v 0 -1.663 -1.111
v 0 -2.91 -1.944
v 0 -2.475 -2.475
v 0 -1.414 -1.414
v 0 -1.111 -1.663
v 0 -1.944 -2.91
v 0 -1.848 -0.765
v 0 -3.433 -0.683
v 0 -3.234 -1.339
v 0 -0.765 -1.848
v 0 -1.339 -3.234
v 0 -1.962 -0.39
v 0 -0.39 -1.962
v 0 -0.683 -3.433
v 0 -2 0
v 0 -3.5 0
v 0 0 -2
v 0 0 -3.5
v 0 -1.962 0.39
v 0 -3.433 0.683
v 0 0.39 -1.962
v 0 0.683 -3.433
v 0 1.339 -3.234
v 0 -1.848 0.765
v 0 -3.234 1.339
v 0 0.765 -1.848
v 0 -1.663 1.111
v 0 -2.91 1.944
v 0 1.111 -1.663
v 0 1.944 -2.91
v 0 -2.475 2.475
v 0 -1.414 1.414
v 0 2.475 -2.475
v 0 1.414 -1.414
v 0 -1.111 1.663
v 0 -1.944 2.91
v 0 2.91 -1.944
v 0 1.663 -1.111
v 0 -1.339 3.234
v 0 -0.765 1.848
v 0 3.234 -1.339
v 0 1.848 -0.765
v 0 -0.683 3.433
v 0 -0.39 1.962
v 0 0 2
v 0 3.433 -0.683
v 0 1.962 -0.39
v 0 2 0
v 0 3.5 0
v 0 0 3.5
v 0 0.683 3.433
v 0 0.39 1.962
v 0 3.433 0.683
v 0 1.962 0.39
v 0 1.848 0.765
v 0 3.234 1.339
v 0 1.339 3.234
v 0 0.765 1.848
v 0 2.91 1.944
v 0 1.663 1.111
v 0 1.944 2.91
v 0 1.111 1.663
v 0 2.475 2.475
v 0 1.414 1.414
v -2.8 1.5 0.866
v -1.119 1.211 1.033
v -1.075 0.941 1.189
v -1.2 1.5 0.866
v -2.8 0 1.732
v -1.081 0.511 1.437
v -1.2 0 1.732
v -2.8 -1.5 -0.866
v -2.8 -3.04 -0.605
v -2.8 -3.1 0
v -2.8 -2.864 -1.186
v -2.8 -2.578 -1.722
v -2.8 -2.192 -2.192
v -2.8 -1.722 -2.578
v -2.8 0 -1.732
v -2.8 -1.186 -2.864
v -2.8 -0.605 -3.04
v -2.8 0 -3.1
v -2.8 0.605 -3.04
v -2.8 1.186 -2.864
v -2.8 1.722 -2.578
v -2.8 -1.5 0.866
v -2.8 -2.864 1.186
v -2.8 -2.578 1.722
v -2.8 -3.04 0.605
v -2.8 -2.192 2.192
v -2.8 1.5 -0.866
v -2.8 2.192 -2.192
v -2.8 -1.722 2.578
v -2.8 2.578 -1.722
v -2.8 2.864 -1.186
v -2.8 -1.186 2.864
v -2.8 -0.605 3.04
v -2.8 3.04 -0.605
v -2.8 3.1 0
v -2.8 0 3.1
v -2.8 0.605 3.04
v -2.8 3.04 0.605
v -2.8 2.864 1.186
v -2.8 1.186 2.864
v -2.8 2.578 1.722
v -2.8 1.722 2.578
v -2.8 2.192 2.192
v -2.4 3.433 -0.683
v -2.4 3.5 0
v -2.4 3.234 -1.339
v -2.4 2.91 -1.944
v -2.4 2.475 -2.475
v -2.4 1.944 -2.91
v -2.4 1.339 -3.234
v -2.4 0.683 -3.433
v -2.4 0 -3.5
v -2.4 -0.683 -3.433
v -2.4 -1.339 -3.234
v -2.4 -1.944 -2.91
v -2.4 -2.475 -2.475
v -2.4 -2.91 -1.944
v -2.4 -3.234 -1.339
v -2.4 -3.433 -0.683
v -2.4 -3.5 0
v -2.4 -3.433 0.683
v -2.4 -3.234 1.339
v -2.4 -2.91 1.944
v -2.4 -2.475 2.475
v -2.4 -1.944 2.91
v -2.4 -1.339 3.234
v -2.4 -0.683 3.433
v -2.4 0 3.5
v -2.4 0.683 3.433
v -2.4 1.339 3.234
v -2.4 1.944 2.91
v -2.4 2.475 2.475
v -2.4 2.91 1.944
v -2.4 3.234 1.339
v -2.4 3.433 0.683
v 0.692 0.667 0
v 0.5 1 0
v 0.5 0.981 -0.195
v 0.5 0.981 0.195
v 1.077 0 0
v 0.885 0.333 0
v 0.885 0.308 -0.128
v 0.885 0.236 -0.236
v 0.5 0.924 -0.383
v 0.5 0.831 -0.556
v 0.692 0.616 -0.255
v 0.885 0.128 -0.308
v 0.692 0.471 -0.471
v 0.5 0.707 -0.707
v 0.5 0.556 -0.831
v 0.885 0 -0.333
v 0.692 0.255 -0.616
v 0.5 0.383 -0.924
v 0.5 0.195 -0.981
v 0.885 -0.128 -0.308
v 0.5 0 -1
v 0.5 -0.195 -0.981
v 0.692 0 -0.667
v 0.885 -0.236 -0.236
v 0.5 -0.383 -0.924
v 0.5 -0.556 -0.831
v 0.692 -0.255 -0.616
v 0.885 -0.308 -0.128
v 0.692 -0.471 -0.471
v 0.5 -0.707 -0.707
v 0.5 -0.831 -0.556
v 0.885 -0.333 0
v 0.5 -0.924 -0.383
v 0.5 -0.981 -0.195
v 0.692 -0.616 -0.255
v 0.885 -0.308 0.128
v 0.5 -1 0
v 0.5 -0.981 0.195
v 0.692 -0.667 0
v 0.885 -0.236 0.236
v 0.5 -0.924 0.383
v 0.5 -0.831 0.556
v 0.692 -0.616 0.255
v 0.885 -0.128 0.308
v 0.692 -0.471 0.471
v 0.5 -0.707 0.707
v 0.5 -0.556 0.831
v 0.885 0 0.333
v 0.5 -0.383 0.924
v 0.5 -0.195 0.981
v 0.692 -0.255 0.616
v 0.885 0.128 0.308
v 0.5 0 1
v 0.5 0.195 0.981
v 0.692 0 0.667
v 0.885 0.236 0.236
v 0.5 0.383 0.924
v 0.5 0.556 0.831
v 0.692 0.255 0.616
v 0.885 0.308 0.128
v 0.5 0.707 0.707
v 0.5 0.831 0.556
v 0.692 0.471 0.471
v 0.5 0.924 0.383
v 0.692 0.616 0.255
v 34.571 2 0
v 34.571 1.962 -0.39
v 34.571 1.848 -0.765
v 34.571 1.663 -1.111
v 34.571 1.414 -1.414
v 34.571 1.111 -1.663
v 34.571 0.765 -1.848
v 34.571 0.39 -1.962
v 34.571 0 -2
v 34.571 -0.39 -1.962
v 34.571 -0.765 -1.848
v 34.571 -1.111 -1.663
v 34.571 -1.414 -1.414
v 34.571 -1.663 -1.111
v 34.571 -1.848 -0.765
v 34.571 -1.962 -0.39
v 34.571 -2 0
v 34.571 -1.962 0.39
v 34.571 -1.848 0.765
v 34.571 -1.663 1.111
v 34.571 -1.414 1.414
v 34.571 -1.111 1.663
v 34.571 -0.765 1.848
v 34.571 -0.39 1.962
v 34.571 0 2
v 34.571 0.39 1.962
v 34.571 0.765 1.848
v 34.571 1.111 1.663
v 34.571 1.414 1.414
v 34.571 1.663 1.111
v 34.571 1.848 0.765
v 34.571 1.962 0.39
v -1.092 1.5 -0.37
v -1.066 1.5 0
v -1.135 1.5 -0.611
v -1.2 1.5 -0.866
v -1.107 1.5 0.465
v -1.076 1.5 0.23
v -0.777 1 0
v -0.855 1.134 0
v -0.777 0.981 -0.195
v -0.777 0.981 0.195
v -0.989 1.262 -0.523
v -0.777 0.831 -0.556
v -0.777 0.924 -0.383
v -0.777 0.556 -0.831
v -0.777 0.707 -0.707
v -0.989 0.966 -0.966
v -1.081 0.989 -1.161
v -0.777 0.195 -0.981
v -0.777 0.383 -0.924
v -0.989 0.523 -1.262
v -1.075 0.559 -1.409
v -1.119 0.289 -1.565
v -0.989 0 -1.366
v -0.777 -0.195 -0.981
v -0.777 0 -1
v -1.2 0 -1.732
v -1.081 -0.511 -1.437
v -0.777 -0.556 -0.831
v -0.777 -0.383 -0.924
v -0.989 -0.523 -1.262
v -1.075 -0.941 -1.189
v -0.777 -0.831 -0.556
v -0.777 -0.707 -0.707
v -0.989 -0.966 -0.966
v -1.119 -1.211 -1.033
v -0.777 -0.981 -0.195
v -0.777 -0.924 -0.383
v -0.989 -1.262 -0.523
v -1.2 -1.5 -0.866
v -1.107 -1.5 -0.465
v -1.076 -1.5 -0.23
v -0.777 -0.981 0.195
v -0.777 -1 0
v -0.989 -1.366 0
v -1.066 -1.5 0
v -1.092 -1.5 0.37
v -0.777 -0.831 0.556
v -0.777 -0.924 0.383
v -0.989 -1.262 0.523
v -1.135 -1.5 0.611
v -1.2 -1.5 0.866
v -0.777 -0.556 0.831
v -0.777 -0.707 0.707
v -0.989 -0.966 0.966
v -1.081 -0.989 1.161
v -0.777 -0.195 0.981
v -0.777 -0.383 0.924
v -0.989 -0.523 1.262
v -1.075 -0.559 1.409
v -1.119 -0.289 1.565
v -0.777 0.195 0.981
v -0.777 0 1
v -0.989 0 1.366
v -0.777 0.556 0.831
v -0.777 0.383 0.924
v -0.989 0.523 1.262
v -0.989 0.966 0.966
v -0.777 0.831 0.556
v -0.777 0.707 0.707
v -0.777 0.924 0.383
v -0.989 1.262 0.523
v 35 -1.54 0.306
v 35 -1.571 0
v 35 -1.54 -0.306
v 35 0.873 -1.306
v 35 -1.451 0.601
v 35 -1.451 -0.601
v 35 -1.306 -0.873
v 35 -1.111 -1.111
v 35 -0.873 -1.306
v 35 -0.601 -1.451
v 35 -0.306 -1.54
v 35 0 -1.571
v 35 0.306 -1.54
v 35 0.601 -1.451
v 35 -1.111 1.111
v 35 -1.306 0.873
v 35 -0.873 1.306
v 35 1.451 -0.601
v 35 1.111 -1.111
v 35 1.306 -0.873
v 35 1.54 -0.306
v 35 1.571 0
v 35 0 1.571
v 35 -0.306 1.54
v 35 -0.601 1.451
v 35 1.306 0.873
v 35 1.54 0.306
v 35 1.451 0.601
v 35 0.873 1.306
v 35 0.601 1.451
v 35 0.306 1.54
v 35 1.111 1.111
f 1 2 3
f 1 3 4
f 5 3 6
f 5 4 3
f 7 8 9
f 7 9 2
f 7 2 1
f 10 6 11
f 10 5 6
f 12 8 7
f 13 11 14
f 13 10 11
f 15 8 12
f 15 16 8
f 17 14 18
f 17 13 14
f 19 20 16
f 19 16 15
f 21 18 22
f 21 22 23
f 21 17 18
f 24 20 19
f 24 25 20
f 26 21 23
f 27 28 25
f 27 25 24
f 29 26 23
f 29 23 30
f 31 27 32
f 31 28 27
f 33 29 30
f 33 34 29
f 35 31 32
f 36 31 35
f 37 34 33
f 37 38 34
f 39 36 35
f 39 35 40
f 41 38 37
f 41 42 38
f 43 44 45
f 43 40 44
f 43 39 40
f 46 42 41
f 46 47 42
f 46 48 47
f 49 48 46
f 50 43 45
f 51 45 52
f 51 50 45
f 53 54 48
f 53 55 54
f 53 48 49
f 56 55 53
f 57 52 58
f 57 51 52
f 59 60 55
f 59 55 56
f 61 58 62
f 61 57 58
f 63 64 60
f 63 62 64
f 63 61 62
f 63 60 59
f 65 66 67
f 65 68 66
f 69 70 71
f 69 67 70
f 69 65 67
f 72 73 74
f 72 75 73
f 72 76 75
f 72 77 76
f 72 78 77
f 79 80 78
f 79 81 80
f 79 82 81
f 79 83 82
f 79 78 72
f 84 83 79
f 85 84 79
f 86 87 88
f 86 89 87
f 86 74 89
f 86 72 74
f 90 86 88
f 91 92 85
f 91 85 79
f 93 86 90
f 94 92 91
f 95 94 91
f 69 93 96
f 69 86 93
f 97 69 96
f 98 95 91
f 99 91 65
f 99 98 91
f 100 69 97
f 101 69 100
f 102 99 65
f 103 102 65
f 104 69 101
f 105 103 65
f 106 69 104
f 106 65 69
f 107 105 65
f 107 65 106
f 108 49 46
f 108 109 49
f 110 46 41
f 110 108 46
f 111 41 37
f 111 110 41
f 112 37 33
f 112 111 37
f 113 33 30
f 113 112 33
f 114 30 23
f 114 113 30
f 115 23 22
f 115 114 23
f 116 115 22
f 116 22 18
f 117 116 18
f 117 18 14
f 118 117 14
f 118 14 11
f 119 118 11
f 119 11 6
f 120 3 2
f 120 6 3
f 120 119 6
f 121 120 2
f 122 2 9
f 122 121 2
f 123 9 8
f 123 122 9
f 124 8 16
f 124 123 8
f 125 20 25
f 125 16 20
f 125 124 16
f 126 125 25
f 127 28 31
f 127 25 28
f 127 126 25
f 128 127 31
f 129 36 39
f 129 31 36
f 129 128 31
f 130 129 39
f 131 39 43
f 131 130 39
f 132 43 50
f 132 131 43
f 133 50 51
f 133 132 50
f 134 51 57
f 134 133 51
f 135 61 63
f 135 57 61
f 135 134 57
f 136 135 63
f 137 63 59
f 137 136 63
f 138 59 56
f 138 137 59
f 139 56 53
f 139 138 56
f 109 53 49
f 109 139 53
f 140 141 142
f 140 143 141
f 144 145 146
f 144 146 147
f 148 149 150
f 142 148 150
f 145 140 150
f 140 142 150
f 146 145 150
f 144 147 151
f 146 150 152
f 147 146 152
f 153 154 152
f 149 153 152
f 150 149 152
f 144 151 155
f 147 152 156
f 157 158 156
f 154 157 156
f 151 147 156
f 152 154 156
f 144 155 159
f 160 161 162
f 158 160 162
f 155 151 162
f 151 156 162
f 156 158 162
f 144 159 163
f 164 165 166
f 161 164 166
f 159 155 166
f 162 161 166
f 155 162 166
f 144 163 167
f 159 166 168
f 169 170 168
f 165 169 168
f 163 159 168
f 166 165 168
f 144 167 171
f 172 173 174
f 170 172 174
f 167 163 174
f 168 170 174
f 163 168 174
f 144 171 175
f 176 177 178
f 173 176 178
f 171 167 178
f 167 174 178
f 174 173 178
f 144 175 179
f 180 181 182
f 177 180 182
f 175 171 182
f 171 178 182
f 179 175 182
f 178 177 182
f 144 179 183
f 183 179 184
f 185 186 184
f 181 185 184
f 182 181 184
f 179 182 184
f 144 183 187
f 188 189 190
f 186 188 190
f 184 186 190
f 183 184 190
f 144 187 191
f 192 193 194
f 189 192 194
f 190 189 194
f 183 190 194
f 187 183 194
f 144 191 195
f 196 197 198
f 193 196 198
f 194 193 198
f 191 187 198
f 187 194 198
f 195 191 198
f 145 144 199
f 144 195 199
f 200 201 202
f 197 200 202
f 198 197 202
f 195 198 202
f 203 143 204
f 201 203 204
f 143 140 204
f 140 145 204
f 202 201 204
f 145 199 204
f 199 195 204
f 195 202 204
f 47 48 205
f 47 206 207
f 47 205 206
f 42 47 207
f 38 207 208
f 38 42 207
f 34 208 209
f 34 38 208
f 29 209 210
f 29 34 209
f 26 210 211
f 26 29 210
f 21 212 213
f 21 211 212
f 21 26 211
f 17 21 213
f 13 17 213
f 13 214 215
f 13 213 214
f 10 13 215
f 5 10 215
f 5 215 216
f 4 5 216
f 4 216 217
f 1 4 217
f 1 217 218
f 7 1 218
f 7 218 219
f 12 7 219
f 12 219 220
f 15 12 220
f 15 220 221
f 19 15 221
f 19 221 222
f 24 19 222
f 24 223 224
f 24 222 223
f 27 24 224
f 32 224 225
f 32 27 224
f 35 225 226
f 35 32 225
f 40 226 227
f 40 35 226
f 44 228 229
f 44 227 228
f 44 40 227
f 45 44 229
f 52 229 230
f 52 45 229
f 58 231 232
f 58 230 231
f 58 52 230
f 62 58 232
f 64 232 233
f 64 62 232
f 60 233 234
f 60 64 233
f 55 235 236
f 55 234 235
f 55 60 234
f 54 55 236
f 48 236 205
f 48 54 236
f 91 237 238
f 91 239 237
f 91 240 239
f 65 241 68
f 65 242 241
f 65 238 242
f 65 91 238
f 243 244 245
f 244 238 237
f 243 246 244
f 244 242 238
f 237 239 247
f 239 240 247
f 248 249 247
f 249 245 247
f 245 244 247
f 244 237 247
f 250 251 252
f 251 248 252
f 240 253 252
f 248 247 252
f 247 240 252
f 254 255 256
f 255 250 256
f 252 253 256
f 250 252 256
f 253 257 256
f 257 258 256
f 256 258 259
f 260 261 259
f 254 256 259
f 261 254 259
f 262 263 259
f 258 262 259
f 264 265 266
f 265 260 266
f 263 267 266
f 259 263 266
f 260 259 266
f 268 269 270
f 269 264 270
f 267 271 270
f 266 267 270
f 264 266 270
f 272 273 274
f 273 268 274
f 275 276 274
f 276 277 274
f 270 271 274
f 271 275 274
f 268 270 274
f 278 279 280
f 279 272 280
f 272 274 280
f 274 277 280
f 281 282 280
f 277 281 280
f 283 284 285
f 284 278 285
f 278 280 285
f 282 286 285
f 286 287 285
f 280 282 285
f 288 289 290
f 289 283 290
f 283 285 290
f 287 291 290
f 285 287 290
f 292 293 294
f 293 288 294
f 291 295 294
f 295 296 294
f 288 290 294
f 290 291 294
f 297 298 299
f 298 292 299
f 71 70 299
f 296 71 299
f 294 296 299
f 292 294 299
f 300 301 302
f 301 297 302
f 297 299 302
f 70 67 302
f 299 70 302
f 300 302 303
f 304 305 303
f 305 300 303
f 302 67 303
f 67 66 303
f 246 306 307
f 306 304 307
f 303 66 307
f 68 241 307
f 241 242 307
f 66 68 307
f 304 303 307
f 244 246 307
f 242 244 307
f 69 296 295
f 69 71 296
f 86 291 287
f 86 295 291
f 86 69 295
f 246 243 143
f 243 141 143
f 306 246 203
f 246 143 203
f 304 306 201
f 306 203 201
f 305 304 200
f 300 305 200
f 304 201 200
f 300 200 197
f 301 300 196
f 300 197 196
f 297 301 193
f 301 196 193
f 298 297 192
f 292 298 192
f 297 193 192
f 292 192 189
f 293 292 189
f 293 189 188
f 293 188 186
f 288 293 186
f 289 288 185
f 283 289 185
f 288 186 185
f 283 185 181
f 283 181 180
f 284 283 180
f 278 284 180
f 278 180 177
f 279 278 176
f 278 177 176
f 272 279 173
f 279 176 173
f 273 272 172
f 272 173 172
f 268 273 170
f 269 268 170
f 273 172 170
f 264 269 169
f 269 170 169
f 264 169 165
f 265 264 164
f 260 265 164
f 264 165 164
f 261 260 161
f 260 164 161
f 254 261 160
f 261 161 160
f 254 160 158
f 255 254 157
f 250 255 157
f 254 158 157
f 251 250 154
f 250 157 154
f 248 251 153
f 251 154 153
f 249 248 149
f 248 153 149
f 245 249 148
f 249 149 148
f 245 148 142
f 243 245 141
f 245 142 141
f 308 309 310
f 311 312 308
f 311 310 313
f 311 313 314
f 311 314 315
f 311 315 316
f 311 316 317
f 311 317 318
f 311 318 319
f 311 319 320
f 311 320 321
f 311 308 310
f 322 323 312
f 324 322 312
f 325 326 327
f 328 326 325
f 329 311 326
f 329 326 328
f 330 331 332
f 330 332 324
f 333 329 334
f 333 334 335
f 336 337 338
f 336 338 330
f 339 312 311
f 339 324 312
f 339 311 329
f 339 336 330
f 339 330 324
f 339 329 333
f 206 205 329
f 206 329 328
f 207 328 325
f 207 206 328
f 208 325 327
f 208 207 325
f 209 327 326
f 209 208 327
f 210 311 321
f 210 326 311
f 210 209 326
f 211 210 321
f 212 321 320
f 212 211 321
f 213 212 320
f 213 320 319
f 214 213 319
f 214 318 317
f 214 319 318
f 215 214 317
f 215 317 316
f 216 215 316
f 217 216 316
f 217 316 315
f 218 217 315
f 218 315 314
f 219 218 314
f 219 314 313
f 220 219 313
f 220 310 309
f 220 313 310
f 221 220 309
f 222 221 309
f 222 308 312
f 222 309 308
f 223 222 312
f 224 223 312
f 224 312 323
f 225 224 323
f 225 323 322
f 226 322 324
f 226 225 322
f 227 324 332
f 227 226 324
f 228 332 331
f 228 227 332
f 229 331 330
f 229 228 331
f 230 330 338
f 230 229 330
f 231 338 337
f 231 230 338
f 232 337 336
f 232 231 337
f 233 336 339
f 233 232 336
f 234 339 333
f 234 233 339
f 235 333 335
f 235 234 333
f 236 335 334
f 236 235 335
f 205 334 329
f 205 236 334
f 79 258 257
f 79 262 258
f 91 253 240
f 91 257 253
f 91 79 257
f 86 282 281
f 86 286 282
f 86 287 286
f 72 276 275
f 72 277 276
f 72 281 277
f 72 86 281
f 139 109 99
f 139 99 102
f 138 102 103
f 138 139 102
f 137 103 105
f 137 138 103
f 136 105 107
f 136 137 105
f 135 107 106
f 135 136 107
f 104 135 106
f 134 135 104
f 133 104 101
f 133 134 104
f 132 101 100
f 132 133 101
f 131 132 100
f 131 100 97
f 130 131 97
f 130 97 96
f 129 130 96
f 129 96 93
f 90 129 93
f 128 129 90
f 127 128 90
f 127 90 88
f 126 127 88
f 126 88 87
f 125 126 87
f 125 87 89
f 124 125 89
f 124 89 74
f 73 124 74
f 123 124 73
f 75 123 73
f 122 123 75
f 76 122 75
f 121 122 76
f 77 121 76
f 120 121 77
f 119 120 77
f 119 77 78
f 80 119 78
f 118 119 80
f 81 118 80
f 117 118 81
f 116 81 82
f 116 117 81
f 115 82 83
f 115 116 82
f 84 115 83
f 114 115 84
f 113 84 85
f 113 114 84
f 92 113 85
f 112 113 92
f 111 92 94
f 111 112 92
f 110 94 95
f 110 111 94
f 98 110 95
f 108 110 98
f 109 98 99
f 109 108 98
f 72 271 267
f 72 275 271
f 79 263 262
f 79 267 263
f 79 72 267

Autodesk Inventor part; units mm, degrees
ref_plane "YZ Plane" through (0, 0, 0) normal (1, 0, 0) x (0, 1, 0)
ref_plane "XZ Plane" through (0, 0, 0) normal (0, 1, 0) x (-1, 0, 0)
sketch "Sketch1" plane through (0, 0, 0) normal (0, 0, 1) x (1, 0, 0)
  line L0 (1.0774, 0) -> (35, 0)
  line L1 (35, 0) -> (35, 2)
  line L2 (35, 2) -> (0, 2)
  line L3 (0, 2) -> (0, 3.5)
  line L4 (0, 3.5) -> (-2.8, 3.5)
  line L5 (-2.8, 3.5) -> (-2.8, 1.7321)
  line L6 (-2.8, 1.7321) -> (-1.2, 1.7321)
  line L7 (-1.2, 1.7321) -> (-0.7774, 1)
  line L8 (-10.36, 0) -> (42.56, 0) projected
  line L9 (0, -0.7) -> (0, 4.2) projected
  line L10 (-0.7774, 1) -> (0.5, 1)
  line L11 (0.5, 1) -> (1.0774, 0)
  line L12 (-2.8, 1.7321) -> (-2.8, 0) construction
  line L13 (-2.8, 3.1) -> (-2.4, 3.5)
  dimension "d0" = 2.8
  dimension "d1" = 1.6
  dimension "d2" = 60
  dimension "d3" = 4
  dimension "d4" = 3.4641
  dimension "d5" = 7
  dimension "d15" = 3.3
  dimension "d16" = 2
  dimension "d17" = 35
  dimension "d32" = 45
  dimension "d33" = 0.4
revolve "Body" add sketch "Sketch1" angle 360 about axis through (1.0774, 0, 0) along (1, 0, 0) contours L11 L10 L9 L2 L1 L0 | L10 L7 L6 L5 L13 L4 L3 L9 | L13 L5 L4
revolve "Chamfer2" cut sketch "Sketch1" angle 360 about axis through (-10, 0, 0) along (1, 0, 0) contours L13 L5 L4
sketch "Sketch2" plane through (-2.8, 0, 0) normal (-1, 0, 0) x (0, 0, 1)
  circle A0 centre (0, 0) radius 1.7321 projected
  line L0 (0, -4.9) -> (0, 4.9) projected
  line L1 (-4.9, 0) -> (4.9, 0) projected
  line L2 (1.7321, 0) -> (0.866, -1.5)
  line L3 (0.866, -1.5) -> (-0.866, -1.5)
  line L4 (-0.866, -1.5) -> (-1.7321, 0)
  line L5 (-1.7321, 0) -> (-0.866, 1.5)
  line L6 (-0.866, 1.5) -> (0.866, 1.5)
  line L7 (0.866, 1.5) -> (1.7321, 0)
extrude "Slot" add sketch "Sketch2" against normal up to next contours L7 A0 | A0 L2 | L6 L0 A0 | A0 L0 L3 | L0 L6 A0 | A0 L3 L0 | L4 A0 | A0 L5
thread "Thread" size "M4x0.7" class "6g" standard "ISO Metric profile" length 14
chamfer "Chamfer1" distance 0.4294 distance2 0.4294 1 edges at (35, -2, 0) measured on face at (35, 0.0262, -0.4421)
ref_plane "Work Plane1" through (17.5, 0, 0) normal (0, 0.5, 0.866) x (1, 0, 0)
equation "\"d0\" = KOH"
equation "\"d1\" = INTI"
equation "\"d3\" = GD"
equation "\"d4\" = 1.1547 * SW"
equation "\"d5\" = KOD"
equation "\"d15\" = INFT"
equation "\"d16\" = SDT"
equation "\"d17\" = NLG"
equation "\"d33\" = Cham"
equation "\"d7\" = GEL"
equation "\"d9\" = -0.5 * SPD + 0.5 * GD"
equation "\"d12\" = GUL"
equation "\"GD\" = NND"
equation "\"NLG\" = 35"
equation "\"GEL\" = 14"
equation "\"KOD\" = 7"
equation "\"KOH\" = 2.8"
equation "\"GUL\" = 0.61345 * PTC"
equation "\"SW\" = 3"
equation "\"INTI\" = 1.6"
equation "\"SPD\" = NND - 1.2269 * PTC"
equation "\"SDT\" = 2"
equation "\"INFT\" = 3.3"
equation "\"Cham\" = 0.4"
equation "\"TOA\" = 30deg"
equation "\"GD1\" = THREADDIA - 1.2269 * PTC"
equation "\"THREADDIA\" = 4"
equation "\"BDM\" = NND"
equation "\"FAWI\" = 45deg"
equation "\"RR\" = 0.1 * NND"
equation "\"PTC\" = 0.7"
equation "\"NND\" = 4"
equation "\"FAWI1\" = 45deg"
equation "\"GAL\" = 0.61345 * PTC"
equation "\"E0\" = 1.155 * SW"
properties part number "DIN 6912 - M4 x 35" material "Steel, Mild"
